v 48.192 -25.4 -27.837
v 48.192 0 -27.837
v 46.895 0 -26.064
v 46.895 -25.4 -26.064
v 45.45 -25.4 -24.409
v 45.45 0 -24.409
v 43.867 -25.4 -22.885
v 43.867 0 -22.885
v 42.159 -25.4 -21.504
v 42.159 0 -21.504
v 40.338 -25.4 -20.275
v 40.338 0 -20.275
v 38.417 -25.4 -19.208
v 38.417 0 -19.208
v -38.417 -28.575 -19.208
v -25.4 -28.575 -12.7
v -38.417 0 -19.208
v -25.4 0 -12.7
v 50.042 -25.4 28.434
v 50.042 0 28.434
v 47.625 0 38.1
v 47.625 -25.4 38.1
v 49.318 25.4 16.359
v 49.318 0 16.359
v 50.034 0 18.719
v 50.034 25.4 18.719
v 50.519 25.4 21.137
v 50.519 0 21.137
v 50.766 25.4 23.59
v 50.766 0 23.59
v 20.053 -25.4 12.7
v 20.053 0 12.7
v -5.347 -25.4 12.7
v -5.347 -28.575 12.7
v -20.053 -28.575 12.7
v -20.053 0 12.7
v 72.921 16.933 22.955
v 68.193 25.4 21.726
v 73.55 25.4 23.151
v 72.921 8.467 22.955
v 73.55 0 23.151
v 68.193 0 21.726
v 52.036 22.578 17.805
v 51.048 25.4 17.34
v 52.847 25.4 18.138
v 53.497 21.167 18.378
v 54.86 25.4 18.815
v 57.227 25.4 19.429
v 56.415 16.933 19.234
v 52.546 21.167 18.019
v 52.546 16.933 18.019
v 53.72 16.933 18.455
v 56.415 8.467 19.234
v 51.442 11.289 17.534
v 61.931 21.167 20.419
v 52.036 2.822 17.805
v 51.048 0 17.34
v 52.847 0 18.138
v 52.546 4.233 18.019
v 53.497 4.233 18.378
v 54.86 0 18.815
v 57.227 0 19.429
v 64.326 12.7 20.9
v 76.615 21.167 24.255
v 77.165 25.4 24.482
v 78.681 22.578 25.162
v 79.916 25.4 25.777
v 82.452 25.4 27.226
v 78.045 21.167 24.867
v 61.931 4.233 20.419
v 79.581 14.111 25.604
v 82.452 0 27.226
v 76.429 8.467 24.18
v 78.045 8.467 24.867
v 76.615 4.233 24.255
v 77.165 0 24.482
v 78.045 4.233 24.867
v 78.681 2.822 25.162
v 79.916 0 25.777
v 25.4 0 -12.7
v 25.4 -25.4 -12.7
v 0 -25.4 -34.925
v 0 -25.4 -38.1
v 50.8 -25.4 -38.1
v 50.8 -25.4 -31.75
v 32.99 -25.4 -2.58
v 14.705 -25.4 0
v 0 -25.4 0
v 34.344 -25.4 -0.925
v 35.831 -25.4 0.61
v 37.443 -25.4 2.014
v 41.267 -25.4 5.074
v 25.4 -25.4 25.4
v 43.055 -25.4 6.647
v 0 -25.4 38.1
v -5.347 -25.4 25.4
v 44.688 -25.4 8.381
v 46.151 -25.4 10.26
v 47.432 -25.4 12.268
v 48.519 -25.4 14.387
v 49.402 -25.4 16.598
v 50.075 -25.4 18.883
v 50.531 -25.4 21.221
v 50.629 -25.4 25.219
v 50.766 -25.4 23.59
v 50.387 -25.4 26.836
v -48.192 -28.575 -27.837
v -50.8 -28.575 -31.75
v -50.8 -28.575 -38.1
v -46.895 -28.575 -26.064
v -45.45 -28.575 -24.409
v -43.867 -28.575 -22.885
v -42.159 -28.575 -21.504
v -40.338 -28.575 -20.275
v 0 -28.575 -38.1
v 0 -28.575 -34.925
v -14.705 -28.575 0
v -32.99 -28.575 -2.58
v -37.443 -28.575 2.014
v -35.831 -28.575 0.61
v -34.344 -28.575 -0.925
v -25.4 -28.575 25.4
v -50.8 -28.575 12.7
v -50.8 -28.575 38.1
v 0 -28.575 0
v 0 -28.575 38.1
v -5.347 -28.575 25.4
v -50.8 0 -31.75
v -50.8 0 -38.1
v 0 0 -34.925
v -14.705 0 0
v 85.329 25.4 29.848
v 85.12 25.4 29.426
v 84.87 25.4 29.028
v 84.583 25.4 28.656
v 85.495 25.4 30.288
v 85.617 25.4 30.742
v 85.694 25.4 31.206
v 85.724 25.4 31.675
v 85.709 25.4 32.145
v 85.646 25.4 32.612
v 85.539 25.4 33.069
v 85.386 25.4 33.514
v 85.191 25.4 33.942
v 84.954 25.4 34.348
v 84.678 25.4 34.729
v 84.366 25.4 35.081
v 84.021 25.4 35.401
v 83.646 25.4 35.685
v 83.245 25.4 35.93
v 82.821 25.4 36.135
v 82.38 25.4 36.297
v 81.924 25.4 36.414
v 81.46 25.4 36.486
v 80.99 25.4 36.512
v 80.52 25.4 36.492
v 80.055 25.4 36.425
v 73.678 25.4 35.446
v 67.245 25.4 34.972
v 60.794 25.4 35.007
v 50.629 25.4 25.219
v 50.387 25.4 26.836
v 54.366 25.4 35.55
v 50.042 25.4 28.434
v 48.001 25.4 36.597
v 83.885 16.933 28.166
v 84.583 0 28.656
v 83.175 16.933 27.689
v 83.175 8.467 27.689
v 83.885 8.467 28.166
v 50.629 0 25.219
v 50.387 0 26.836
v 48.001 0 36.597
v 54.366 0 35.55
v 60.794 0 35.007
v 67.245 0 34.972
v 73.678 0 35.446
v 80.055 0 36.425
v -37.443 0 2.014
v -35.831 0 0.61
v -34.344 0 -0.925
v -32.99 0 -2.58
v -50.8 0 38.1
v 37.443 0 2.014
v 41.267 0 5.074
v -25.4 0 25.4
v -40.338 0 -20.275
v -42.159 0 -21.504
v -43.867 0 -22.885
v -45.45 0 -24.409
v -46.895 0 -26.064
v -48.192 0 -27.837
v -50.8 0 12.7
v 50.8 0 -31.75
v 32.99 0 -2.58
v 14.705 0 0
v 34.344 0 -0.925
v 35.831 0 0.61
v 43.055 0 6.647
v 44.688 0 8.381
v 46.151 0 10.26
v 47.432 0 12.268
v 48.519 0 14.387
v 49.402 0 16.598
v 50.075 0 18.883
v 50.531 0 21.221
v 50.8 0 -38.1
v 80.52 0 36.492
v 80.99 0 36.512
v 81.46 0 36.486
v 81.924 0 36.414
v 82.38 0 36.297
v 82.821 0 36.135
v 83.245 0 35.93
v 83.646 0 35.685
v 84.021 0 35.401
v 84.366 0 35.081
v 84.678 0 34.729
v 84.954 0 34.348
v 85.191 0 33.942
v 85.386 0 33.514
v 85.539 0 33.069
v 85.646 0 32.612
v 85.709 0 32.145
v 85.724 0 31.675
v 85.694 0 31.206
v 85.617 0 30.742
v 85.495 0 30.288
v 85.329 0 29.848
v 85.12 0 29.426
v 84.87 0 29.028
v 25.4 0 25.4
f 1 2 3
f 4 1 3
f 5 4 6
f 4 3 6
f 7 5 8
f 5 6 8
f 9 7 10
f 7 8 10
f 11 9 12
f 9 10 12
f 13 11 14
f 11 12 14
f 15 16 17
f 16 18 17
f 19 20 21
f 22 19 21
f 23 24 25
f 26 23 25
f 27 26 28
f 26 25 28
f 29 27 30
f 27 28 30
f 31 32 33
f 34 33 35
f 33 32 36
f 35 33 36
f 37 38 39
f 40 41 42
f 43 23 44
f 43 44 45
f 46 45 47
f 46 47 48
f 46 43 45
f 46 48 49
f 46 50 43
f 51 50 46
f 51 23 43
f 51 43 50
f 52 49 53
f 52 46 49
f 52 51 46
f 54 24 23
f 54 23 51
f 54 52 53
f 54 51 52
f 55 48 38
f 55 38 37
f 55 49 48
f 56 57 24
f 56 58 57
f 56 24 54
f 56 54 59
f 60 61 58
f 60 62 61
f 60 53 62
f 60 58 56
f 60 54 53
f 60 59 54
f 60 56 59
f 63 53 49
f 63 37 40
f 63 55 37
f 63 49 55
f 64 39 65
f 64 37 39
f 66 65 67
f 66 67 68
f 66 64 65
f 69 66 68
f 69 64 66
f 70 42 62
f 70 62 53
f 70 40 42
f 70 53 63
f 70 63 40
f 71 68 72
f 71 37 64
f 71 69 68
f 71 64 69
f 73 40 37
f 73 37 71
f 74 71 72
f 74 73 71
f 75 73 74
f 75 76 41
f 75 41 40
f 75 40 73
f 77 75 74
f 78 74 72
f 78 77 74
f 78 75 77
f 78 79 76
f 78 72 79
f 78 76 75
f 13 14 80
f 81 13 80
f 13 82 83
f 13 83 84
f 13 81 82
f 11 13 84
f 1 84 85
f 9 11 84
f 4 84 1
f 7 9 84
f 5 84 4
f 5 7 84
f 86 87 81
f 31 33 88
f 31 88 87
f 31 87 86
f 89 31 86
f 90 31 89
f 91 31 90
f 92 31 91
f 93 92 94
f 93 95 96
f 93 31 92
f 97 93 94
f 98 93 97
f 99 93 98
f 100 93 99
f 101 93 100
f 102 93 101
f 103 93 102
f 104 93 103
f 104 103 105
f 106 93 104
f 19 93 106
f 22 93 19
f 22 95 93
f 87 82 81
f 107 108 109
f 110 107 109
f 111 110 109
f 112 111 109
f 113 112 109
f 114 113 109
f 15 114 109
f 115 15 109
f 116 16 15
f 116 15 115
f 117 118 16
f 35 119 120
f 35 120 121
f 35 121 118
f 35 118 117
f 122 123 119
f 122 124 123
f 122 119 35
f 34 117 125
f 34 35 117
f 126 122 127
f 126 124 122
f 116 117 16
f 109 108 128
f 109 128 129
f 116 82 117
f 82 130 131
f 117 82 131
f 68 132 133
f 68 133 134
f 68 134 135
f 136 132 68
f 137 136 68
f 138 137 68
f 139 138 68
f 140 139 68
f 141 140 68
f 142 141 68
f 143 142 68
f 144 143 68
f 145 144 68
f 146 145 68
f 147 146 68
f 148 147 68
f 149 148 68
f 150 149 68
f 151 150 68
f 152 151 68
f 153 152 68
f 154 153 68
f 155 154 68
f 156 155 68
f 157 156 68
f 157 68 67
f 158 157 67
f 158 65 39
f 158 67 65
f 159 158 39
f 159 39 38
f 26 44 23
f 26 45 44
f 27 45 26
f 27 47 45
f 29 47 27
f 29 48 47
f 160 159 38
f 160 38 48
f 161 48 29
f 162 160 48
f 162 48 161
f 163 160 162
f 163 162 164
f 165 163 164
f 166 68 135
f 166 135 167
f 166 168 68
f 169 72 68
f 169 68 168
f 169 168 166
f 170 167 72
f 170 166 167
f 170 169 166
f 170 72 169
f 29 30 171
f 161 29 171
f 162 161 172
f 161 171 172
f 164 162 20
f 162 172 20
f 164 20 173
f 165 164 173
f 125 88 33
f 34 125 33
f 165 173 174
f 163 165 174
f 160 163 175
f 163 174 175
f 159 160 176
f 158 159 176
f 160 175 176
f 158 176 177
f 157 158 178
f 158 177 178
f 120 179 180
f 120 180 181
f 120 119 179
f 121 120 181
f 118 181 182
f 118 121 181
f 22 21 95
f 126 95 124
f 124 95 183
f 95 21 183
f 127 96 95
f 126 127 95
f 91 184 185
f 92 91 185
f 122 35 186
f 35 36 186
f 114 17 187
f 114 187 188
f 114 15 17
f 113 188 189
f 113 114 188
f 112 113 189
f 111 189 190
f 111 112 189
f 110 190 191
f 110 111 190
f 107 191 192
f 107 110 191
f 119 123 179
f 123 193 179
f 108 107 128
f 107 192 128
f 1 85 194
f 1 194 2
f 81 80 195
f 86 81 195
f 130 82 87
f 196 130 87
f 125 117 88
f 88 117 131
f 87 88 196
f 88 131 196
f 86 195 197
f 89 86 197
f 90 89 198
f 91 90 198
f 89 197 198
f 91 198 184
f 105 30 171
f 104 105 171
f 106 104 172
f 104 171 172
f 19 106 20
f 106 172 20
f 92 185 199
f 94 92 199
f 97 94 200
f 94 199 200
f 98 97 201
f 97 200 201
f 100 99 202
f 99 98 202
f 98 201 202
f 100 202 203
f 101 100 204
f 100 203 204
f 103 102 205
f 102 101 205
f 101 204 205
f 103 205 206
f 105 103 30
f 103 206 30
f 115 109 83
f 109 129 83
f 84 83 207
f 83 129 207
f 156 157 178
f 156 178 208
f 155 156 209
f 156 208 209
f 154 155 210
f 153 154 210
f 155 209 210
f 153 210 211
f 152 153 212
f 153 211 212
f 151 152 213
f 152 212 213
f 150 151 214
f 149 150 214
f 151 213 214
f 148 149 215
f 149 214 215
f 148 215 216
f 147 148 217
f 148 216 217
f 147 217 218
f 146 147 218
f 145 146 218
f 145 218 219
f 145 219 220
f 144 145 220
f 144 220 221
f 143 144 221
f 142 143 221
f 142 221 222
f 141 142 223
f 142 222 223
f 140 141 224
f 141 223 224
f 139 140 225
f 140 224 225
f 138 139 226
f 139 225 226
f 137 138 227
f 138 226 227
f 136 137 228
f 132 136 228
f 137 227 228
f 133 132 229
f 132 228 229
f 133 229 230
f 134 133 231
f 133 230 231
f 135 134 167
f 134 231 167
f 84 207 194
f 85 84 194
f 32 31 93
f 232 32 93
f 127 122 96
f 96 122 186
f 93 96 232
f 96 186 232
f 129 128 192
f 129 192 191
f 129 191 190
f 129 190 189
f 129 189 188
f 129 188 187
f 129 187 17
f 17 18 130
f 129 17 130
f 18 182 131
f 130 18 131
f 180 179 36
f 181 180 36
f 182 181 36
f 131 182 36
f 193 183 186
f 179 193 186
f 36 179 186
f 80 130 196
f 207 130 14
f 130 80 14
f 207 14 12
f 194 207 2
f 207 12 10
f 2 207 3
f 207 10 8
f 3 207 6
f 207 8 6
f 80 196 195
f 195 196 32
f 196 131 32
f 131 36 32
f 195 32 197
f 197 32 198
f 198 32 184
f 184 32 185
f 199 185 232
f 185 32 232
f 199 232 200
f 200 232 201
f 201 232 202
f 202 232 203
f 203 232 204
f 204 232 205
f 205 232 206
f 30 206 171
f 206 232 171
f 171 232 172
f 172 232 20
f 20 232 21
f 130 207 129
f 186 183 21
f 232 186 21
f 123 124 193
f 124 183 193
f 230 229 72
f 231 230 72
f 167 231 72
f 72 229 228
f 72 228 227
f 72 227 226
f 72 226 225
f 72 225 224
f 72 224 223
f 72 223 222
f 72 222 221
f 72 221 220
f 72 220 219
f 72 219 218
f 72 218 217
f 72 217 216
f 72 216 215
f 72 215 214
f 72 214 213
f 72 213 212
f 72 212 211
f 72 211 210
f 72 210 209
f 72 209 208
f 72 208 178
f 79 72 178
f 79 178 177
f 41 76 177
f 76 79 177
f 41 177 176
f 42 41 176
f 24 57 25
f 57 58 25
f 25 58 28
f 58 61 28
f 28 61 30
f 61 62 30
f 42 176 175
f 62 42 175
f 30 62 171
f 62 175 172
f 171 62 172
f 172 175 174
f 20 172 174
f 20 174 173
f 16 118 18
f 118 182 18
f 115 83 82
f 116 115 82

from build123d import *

# Parameters (mm, degrees)
F1_DEPTH    = 25.4
F2_T1_DEPTH = 25.4
F2_T3_DEPTH = 41.0344144534
F2_T5_DEPTH = 86.4393556308
F2_T7_DEPTH = 59.1266835085
F4_DEPTH    = 25.4
F6_DEPTH    = 50.8010001
F8_DEPTH    = 3.175
F9_R        = 25.4


# Not quite as in the source:
# - a fillet or chamfer that OpenCascade refuses, or shapes differently, is made with other operations: its cross-section is extruded or revolved along the edge and cut away or added


with BuildPart() as f1:
    # F0 (on Front) → F1 (new body)
    with BuildSketch(Plane.XZ):
        Polygon((-50.8, -38.1), (50.8, -38.1), (50.8, -31.75), (44.45, -22.225), (25.4, -12.7), (34.925, 0), (50.8, 12.7), (50.8, 25.4), (47.625, 38.1), (-50.8, 38.1), (-50.8, 12.7), (-34.925, 0), (-25.4, -12.7), (-44.45, -22.225), (-50.8, -31.75), align=None)
    extrude(amount=F1_DEPTH)

    # F2: fillet of radius 25.4 on 4 edges, made by hand

    # F2_s2 → F2_t1 (join)
    with BuildSketch(Plane.XZ):
        with BuildLine():
            ThreePointArc((32.9902416385, -2.5796778154), (35.0713900731, -0.1418868454), (37.4429874306, 2.0143899445))
            Line((37.4429874306, 2.0143899445), (34.925, 0))
            Line((34.925, 0), (32.9902416385, -2.5796778154))
        make_face()
    extrude(amount=F2_T1_DEPTH)

    # F2_s4 → F2_t3 (cut)
    with BuildSketch(Plane.XZ.offset(-7.8172072267)):
        with BuildLine():
            ThreePointArc((50.8, 22.2731171093), (50.6096919397, 25.3765720072), (50.0416195037, 28.4335219852))
            Line((50.0416195037, 28.4335219852), (50.8, 25.4))
            Line((50.8, 25.4), (50.8, 22.2731171093))
        make_face()
    extrude(amount=F2_T3_DEPTH, mode=Mode.SUBTRACT)

    # F2_s6 → F2_t5 (cut)
    with BuildSketch(Plane.XZ.offset(-30.5196778154)):
        with BuildLine():
            ThreePointArc((41.2672542079, 5.0738033663), (48.2931022022, 13.9048773717), (50.8, 24.9078711262))
            Line((50.8, 24.9078711262), (50.8, 12.7))
            Line((50.8, 12.7), (41.2672542079, 5.0738033663))
        make_face()
    extrude(amount=F2_T5_DEPTH, mode=Mode.SUBTRACT)

    # F2_s8 → F2_t7 (cut)
    with BuildSketch(Plane.XZ.offset(-16.8633417542)):
        with BuildLine():
            ThreePointArc((48.191639592, -27.8374593881), (43.867347222, -22.8850187065), (38.4167874416, -19.2083937208))
            Line((38.4167874416, -19.2083937208), (44.45, -22.225))
            Line((44.45, -22.225), (48.191639592, -27.8374593881))
        make_face()
    extrude(amount=F2_T7_DEPTH, mode=Mode.SUBTRACT)

    # F5 (on face) → F6 (cut, through all)
    with BuildSketch(Plane.XZ.offset(25.4)):
        Polygon((25.4, 25.4), (-25.4, 25.4), (-20.0526315789, 12.7), (20.0526315789, 12.7), align=None)
        Polygon((14.7052631579, 0), (-14.7052631579, 0), (0, -34.925), align=None)
    extrude(amount=-F6_DEPTH, mode=Mode.SUBTRACT)

    # F7 (on face) → F8 (join)
    with BuildSketch(Plane.XZ.offset(25.4)):
        Polygon((-14.7052631579, 0), (0, 0), (-5.3473684211, 12.7), (-20.0526315789, 12.7), (-25.4, 25.4), (-5.3473684211, 25.4), (0, 38.1), (-50.8, 38.1), (-50.8, 12.7), (-34.925, 0), (-25.4, -12.7), (-44.45, -22.225), (-50.8, -31.75), (-50.8, -38.1), (0, -38.1), (0, -34.925), align=None)
    extrude(amount=F8_DEPTH)

    # F9
    f9_edges = [f1.edges().sort_by_distance(p)[0] for p in [
        (-34.925, -14.2875, 0),
        (-44.45, -14.2875, -22.225),
    ]]
    fillet(f9_edges, radius=F9_R)


with BuildPart() as f4:
    # F3 (on face) → F4 (new body)
    with BuildSketch(Plane(origin=(0, 0, 0), x_dir=(-1, 0, 0), z_dir=(0, 1, 0))):
        with BuildLine():
            ThreePointArc((-48.0006987759, 36.5972048963), (-64.0191987714, 34.9261782663), (-80.0547112422, 36.4251819025))
            ThreePointArc((-80.0547112422, 36.4251819025), (-85.0772133008, 34.1480285032), (-84.5827576486, 28.6556275583))
            add(Edge.make_bspline(
                [(-82.4520441677, 27.2264323347), (-83.1820950721, 27.6822920244), (-83.8902700056, 28.1587482087), (-84.5827576486, 28.6556275583)],
                knots=[0.9280008954, 0.9280008954, 0.9280008954, 0.9280008954, 1, 1, 1, 1], degree=3))
            add(Edge.make_bspline(
                [(-49.3181387168, 16.3590325895), (-51.4536007413, 17.6963242827), (-56.3528215031, 19.6709837112), (-72.2028273002, 22.0187338367), (-79.6974095968, 25.5063784956), (-82.4520441677, 27.2264323347)],
                knots=[0, 0, 0, 0, 0.2639502882, 0.6563332329, 0.9280008954, 0.9280008954, 0.9280008954, 0.9280008954], degree=3))
            ThreePointArc((-49.3181387168, 16.3590325895), (-50.3058327868, 19.9219416041), (-50.7658139593, 23.5904941174))
            ThreePointArc((-50.7658139593, 23.5904941174), (-50.5207002315, 26.0295009926), (-50.0416195037, 28.4335219852))
            Line((-50.0416195037, 28.4335219852), (-48.0006987759, 36.5972048963))
        make_face()
    extrude(amount=F4_DEPTH)


solid = Compound([f1.part, f4.part])
